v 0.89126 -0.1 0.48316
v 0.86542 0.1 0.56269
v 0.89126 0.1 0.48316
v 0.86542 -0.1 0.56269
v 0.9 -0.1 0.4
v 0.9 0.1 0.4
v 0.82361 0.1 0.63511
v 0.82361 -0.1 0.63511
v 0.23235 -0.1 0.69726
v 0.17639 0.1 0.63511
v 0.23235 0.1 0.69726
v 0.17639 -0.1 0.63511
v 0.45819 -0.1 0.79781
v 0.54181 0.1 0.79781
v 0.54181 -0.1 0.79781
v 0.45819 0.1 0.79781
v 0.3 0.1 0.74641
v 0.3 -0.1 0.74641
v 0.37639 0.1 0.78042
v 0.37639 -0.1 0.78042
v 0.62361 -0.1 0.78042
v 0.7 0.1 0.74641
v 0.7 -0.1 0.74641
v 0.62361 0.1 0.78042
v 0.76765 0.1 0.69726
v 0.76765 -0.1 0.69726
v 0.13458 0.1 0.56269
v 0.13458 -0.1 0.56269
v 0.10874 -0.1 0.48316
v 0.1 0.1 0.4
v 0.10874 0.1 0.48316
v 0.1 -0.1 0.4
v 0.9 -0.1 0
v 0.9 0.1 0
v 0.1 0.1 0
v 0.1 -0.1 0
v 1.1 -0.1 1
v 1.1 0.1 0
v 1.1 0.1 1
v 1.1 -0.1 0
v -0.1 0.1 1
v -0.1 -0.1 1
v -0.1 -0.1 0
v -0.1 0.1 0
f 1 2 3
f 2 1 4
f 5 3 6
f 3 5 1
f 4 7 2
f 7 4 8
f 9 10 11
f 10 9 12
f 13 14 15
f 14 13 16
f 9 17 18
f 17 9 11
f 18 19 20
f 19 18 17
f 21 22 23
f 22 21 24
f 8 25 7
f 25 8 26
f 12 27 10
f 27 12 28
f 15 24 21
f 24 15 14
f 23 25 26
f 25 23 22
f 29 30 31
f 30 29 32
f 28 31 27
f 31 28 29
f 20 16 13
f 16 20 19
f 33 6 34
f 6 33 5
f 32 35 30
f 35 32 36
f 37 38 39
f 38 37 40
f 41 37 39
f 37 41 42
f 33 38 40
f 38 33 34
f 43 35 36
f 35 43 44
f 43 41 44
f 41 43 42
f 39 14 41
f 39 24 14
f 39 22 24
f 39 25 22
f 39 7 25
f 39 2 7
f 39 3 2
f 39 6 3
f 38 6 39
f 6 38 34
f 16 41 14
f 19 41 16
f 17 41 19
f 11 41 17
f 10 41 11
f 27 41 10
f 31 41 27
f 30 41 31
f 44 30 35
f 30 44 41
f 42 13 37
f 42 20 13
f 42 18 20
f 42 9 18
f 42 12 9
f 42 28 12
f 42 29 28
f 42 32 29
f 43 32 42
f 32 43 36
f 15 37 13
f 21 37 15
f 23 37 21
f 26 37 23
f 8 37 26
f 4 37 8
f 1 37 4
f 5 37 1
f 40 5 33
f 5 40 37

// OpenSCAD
color([0.3, 0.3, 0.5])
difference() {
    translate([-0.1,-0.1,0])
    cube([1.2, .2, 1], false);

    
    rotate([90, 0, 0])
    {
        translate([.5, .4, 0]) 
        cylinder(.3, .4, .4, center = true,
                 $fn=30);
        translate([.5, 0, 0])
        cube([.8, .8, .3], center = true);
        
    }

}
